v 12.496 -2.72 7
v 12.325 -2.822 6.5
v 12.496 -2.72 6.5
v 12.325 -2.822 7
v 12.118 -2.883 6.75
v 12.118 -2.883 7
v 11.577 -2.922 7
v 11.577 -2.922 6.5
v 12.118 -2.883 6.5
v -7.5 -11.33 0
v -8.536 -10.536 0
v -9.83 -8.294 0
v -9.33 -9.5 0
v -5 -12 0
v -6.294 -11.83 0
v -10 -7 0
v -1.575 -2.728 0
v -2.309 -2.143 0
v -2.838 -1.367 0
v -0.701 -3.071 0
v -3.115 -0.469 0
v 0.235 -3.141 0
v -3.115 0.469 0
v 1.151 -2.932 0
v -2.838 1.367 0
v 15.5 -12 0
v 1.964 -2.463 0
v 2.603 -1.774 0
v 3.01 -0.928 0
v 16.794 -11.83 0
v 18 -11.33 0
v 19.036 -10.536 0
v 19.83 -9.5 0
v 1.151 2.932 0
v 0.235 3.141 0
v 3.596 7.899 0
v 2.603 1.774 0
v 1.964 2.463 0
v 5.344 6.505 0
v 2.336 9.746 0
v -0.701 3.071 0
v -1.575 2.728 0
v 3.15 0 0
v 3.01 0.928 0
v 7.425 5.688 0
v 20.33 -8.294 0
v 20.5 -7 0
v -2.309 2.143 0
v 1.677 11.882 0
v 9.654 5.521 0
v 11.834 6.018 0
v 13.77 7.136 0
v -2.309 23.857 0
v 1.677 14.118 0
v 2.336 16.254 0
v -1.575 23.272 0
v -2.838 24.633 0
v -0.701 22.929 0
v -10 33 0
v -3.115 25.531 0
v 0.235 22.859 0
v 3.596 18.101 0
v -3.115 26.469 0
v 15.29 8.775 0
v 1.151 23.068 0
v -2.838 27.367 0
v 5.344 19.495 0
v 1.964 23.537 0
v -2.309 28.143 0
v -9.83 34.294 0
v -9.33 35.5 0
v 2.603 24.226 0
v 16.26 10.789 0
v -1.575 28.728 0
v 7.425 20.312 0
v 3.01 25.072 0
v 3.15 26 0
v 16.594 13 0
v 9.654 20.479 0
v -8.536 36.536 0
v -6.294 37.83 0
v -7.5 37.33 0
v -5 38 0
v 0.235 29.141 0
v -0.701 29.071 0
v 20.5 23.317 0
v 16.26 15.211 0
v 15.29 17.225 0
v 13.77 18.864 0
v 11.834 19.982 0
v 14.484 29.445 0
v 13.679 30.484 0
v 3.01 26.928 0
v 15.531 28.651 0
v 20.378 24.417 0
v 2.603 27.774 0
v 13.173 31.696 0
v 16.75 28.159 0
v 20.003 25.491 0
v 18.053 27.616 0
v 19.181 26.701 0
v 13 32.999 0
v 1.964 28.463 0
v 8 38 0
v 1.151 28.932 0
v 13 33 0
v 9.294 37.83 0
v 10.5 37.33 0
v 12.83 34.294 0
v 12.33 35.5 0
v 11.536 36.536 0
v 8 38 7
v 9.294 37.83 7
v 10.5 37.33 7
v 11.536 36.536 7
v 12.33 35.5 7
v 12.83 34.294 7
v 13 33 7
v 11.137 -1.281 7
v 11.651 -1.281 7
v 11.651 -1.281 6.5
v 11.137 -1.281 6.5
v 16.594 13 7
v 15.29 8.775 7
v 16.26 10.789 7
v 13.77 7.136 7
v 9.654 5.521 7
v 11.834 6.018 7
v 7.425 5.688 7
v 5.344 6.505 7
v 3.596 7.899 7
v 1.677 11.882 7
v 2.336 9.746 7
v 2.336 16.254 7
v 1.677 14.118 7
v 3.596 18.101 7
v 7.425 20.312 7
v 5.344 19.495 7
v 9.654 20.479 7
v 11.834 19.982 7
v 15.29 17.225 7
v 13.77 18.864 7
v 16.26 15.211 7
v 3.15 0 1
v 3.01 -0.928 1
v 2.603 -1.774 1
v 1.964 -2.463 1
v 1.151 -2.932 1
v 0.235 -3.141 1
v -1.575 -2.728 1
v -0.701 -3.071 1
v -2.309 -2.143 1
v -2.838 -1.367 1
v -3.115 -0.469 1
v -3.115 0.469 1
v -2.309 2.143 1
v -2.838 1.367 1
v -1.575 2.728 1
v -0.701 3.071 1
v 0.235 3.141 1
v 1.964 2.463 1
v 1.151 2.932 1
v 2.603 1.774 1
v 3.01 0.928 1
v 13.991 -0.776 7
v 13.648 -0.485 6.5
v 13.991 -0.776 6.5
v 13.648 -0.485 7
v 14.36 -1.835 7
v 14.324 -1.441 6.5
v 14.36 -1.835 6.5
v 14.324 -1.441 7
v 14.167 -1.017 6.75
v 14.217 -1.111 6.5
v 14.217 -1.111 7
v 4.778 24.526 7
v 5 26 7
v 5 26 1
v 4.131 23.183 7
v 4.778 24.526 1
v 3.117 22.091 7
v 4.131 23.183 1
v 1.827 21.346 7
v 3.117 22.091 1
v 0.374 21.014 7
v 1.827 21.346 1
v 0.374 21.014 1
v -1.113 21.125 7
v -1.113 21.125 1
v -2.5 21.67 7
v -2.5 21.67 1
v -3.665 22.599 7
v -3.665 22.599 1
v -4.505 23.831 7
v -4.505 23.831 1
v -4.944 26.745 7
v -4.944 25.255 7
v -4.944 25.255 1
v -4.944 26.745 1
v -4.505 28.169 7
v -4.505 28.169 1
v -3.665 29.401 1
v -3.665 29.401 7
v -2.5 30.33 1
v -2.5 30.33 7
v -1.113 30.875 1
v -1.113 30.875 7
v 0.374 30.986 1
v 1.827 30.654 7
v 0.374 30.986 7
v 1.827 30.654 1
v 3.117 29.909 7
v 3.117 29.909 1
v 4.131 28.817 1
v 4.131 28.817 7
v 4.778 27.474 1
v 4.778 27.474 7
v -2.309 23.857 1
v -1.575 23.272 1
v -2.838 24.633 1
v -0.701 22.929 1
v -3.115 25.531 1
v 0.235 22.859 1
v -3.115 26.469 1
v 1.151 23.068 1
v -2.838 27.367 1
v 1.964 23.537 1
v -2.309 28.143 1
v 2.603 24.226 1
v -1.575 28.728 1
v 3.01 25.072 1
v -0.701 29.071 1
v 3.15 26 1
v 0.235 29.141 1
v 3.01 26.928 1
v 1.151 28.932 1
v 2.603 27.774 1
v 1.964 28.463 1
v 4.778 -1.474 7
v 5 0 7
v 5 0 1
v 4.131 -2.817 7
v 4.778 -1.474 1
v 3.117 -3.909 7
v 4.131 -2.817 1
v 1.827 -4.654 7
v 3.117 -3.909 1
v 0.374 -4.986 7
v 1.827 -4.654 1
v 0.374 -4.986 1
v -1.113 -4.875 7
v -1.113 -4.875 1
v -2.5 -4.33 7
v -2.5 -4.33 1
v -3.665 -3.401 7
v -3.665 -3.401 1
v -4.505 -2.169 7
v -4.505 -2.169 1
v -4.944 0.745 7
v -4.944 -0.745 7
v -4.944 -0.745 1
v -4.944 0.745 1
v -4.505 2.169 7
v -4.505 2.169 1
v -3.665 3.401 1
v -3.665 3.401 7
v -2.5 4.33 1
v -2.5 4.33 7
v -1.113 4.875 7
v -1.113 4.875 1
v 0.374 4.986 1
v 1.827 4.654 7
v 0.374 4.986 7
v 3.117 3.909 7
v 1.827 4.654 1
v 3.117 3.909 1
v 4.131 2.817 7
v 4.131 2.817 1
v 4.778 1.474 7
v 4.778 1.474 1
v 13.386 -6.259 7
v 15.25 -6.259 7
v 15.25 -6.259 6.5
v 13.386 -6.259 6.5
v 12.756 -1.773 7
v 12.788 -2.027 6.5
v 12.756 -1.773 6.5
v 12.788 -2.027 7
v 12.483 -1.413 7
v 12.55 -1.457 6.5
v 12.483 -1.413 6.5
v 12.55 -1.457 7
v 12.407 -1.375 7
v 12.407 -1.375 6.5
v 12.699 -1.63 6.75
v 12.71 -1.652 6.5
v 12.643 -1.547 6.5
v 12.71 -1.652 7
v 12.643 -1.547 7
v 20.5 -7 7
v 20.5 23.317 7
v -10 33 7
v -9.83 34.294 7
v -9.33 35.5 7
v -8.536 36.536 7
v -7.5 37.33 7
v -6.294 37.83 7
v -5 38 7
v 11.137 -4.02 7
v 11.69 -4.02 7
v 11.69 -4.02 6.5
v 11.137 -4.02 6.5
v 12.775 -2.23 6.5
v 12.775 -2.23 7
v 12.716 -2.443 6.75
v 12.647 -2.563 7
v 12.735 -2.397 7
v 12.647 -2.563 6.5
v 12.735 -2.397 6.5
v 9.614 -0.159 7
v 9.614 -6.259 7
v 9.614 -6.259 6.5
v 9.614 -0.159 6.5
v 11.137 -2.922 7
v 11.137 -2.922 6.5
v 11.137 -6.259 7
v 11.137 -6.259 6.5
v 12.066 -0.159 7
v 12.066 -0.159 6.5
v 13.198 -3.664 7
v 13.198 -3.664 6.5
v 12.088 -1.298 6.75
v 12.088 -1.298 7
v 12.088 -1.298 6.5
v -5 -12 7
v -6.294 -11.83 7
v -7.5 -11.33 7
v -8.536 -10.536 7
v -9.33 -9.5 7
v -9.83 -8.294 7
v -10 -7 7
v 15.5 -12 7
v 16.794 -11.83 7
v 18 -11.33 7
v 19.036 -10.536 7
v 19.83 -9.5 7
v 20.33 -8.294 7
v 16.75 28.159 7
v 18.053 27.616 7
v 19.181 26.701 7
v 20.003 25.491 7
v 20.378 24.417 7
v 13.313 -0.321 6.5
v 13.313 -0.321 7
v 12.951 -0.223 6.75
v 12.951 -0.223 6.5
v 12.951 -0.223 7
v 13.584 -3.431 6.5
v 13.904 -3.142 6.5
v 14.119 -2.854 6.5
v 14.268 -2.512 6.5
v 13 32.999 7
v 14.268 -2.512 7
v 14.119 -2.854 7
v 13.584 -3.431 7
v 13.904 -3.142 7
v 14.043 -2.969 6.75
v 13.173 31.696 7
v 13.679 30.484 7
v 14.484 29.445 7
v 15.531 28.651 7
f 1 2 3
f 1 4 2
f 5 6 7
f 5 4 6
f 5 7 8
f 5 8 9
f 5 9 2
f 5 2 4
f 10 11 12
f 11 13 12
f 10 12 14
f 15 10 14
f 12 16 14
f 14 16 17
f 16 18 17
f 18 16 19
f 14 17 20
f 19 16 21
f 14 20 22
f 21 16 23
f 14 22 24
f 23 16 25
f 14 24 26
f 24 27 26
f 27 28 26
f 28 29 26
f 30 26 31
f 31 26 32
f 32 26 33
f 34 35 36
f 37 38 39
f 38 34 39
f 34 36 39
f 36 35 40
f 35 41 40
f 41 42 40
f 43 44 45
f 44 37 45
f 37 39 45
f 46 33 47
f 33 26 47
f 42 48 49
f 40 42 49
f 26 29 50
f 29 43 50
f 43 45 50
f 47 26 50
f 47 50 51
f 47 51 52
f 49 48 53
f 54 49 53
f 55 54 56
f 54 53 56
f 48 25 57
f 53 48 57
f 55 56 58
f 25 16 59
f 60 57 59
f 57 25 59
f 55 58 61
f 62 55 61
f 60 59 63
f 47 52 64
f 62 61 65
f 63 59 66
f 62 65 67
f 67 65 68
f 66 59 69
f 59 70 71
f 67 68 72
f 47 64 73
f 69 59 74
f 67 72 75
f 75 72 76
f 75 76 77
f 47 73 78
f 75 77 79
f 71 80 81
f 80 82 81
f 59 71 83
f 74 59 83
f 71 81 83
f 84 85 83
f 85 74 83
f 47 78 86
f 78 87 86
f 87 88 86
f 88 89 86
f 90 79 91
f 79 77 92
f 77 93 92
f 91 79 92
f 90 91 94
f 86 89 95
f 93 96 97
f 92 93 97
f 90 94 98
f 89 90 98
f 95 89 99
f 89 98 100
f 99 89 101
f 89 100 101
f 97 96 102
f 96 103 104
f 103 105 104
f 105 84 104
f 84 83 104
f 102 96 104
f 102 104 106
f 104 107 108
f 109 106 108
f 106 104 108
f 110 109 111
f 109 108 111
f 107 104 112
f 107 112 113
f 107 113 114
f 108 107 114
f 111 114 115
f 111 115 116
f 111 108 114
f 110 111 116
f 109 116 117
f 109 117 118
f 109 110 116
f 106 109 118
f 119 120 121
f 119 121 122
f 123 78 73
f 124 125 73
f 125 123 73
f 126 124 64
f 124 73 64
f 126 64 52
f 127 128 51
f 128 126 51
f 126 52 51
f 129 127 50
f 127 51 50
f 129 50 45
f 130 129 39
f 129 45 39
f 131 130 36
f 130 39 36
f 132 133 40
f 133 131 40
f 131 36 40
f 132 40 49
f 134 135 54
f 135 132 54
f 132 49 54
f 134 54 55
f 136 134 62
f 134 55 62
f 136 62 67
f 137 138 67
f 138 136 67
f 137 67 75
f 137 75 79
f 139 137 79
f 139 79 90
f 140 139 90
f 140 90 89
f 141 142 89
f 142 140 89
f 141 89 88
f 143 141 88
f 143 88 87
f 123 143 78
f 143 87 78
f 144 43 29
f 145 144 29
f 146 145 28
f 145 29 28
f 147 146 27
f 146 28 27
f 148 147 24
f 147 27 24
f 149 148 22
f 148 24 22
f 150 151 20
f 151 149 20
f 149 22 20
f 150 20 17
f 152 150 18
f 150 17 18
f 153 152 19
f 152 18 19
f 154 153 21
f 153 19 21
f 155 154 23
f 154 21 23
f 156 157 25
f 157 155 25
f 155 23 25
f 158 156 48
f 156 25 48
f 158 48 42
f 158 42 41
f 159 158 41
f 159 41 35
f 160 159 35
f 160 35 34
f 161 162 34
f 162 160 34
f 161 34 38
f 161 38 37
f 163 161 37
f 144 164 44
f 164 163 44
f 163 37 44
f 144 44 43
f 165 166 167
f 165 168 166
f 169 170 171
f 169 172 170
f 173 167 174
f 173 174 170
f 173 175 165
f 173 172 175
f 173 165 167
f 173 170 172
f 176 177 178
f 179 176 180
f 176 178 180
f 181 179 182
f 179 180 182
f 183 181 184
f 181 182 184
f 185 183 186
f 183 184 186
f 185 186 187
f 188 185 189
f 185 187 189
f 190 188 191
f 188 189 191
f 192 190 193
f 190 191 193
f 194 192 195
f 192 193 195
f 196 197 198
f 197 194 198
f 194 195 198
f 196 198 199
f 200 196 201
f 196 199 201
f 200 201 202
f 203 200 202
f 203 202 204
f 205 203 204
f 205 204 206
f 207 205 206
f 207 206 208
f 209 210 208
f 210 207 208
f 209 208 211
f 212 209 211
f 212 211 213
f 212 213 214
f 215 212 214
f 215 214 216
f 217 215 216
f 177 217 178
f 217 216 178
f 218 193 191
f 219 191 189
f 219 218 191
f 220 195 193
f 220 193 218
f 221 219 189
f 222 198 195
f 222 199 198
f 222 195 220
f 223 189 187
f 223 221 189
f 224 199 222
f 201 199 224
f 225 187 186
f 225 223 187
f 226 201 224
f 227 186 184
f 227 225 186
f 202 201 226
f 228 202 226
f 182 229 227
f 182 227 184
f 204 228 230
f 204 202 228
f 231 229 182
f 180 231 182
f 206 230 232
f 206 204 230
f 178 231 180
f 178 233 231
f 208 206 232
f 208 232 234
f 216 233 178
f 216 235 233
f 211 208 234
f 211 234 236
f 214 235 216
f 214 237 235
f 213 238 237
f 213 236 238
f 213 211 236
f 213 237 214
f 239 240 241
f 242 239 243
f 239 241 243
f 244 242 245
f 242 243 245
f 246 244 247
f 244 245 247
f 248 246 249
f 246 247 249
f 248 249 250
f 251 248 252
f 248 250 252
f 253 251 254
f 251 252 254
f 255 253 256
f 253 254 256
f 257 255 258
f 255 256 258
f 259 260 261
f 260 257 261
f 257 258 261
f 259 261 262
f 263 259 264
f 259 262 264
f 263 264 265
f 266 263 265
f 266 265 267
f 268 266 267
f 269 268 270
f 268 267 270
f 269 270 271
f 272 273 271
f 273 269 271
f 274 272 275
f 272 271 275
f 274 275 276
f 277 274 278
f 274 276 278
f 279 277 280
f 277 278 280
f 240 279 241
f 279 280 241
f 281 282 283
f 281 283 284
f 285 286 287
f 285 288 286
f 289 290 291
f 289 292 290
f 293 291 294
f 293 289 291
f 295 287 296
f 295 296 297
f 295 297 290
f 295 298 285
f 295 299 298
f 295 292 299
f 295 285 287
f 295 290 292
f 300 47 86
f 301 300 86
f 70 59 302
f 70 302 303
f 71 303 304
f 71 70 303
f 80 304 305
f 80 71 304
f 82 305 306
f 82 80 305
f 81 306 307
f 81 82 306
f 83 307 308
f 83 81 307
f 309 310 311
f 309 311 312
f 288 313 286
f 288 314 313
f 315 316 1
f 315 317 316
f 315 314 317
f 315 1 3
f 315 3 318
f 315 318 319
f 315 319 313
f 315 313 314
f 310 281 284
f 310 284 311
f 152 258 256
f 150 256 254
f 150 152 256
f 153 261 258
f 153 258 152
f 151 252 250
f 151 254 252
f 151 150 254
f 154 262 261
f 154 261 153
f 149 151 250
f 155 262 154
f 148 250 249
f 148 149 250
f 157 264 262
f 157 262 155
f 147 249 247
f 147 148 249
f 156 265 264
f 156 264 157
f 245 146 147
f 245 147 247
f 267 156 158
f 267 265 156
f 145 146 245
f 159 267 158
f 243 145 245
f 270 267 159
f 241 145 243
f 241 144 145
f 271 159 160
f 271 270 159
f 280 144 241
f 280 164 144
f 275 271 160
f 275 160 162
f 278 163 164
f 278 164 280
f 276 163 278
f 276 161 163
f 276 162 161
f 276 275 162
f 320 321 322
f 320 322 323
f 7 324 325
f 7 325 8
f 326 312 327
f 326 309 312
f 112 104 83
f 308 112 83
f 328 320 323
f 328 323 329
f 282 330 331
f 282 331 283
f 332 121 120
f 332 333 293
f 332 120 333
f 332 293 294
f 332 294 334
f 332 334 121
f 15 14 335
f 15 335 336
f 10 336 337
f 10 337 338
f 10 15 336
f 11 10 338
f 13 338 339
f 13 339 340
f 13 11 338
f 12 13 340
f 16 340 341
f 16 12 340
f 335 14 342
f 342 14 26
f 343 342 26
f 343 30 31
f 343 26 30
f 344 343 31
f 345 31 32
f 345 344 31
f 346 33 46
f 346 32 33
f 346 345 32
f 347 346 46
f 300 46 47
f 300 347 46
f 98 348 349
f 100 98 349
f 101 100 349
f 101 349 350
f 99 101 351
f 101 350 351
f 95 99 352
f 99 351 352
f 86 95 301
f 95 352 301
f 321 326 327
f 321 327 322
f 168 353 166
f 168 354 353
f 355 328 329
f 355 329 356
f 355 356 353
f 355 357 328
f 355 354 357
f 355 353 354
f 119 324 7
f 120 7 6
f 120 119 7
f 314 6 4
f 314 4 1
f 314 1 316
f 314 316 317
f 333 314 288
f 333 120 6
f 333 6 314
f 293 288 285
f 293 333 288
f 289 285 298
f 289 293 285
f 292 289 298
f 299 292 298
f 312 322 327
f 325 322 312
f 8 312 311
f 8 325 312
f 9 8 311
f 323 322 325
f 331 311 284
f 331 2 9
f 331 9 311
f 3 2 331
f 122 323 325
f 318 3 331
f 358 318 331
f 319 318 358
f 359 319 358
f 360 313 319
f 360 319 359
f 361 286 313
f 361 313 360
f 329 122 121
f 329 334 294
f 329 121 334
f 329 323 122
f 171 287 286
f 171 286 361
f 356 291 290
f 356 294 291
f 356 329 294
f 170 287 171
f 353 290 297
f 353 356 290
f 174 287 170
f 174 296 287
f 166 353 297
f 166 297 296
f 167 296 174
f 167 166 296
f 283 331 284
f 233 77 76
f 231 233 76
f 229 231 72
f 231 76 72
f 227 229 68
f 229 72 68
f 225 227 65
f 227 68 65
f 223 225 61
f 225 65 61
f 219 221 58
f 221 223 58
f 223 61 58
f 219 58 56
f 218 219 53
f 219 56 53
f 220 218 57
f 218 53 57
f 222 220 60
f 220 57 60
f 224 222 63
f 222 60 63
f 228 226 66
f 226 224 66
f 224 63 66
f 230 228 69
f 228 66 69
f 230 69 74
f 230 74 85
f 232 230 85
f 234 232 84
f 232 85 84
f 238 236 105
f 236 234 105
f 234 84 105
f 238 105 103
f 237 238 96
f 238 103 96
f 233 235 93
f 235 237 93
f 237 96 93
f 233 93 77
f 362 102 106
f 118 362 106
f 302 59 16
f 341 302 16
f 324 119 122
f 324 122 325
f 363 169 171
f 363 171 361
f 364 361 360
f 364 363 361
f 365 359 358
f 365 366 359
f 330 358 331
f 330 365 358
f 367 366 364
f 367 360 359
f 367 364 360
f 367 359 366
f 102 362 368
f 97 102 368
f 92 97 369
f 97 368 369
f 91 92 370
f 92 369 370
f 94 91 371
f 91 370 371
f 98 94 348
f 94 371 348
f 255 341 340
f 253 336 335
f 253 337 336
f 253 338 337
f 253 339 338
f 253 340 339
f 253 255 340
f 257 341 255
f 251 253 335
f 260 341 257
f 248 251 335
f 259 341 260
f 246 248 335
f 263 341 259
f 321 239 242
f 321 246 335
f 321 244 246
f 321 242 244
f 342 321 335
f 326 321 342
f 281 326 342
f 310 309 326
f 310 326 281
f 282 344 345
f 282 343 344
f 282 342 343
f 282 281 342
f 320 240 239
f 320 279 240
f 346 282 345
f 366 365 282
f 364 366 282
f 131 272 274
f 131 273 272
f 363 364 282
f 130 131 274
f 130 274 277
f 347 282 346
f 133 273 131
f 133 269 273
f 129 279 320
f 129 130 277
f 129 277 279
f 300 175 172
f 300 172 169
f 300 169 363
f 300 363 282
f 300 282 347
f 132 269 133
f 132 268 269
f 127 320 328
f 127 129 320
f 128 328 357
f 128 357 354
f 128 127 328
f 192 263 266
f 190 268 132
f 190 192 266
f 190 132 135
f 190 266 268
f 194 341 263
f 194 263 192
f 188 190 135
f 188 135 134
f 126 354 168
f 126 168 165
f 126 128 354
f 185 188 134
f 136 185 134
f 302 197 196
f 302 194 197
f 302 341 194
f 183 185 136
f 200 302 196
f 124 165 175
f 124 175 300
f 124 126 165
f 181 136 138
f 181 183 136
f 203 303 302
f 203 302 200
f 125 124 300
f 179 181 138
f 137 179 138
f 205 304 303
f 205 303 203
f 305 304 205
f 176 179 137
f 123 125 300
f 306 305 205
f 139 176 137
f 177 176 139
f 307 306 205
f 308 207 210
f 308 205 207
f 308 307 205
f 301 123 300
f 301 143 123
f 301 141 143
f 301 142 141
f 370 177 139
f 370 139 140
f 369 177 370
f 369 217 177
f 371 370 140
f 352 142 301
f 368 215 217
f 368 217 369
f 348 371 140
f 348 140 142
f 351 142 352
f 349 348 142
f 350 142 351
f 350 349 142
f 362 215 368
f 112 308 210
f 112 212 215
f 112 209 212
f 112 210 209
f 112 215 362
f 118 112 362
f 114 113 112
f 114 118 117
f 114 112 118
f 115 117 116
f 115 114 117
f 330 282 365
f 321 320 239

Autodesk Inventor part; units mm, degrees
ref_plane "YZ Plane" through (0, 0, 0) normal (1, 0, 0) x (0, 1, 0)
ref_plane "XZ Plane" through (0, 0, 0) normal (0, 1, 0) x (-1, 0, 0)
ref_plane "XY Plane" through (0, 0, 0) normal (0, 0, 1) x (1, 0, 0)
sketch "S-SupportBase" plane through (0, 0, 0) normal (0, 0, 1) x (1, 0, 0)
  line L0 (0, 48) -> (0, -22) construction
  line L1 (0, 0) -> (20.5, 0) construction
  circle A0 centre (0, 0) radius 5
  circle A1 centre (0, 0) radius 3.15
  line L2 (0, -12) -> (20.5, -12)
  line L3 (20.5, -12) -> (20.5, 28)
  line L4 (20.5, 28) -> (13, 28)
  line L5 (13, 28) -> (13, 38)
  line L6 (13, 38) -> (-10, 38)
  line L7 (-10, 38) -> (-10, -12)
  line L8 (-10, -12) -> (0, -12)
  circle A2 centre (0, 26) radius 5
  circle A3 centre (0, 26) radius 3.15
  circle A4 centre (9.0936, 13) radius 7.5
  line L9 (8.9816, -0.1589) -> (15.0717, -0.1589) construction
  line L10 (15.0717, -0.1589) -> (15.0717, -6.2589) construction
  line L11 (15.0717, -6.2589) -> (8.9816, -6.2589) construction
  line L12 (8.9816, -6.2589) -> (8.9816, -0.1589) construction
  line L13 (15.2496, -6.2589) -> (13.386, -6.2589)
  line L14 (13.386, -6.2589) -> (11.6905, -4.0196)
  line L15 (11.6905, -4.0196) -> (11.1368, -4.0196)
  line L16 (11.1368, -4.0196) -> (11.1368, -6.2589)
  line L17 (11.1368, -6.2589) -> (9.6143, -6.2589)
  line L18 (9.6143, -6.2589) -> (9.6143, -0.1589)
  line L19 (9.6143, -0.1589) -> (12.0662, -0.1589)
  spline S0 degree 2 poles (12.0662, -0.1589) (12.5753, -0.1589) (13.3267, -0.2875) (13.648, -0.4852) knots 0 0 0 1 2 2 2
  spline S1 degree 2 poles (13.648, -0.4852) (13.9743, -0.6928) (14.3598, -1.3404) (14.3598, -1.8347) knots 0 0 0 1 2 2 2
  spline S2 degree 2 poles (14.3598, -1.8347) (14.3598, -2.5317) (13.7271, -3.4067) (13.1982, -3.6637) knots 0 0 0 1 2 2 2
  line L20 (13.1982, -3.6637) -> (15.2496, -6.2589)
  spline S3 degree 2 poles (12.7879, -2.0275) (12.7879, -1.7952) (12.6099, -1.464) (12.4072, -1.375) knots 0 0 0 1 2 2 2
  spline S4 degree 2 poles (12.4072, -1.375) (12.2639, -1.3157) (11.9129, -1.2811) (11.6509, -1.2811) knots 0 0 0 1 2 2 2
  line L21 (11.6509, -1.2811) -> (11.1368, -1.2811)
  line L22 (11.1368, -1.2811) -> (11.1368, -2.9222)
  line L23 (11.1368, -2.9222) -> (11.5768, -2.9222)
  spline S5 degree 2 poles (11.5768, -2.9222) (11.8931, -2.9222) (12.343, -2.8431) (12.4962, -2.7196) knots 0 0 0 1 2 2 2
  spline S6 degree 2 poles (12.4962, -2.7196) (12.6445, -2.6009) (12.7879, -2.2846) (12.7879, -2.0275) knots 0 0 0 1 2 2 2
  dimension "d0" = 20.5
  dimension "d1" = 10
  dimension "d2" = 6.3
  dimension "d3" = 12
  dimension "d4" = 10
  dimension "d5" = 40
  dimension "d6" = 10
  dimension "d9" = 26
  dimension "d14" = 23
  dimension "d20" = 15
extrude "Ex-Base1" add sketch "S-SupportBase" along normal blind 1 contours A0 | L8 L7 L6 L5 L4 L3 L2 | A2 | L13 L14 L15 L16 L17 L18 L19 S0 S1 S2 L20 | S6 S5 L23 L22 L21 S4 S3
extrude "Ex-Base2" add sketch "S-SupportBase" along normal blind 7 contours L8 L7 L6 L5 L4 L3 L2 | L13 L14 L15 L16 L17 L18 L19 S0 S1 S2 L20 | S6 S5 L23 L22 L21 S4 S3
fillet "Rundung1" radius 5 6 edges at (-10, -12, 3.5) (-10, 38, 3.5) (13, 38, 3.5) (13, 28, 3.5) (20.5, 28, 3.5) (20.5, -12, 3.5)
extrude "Extrusion3" cut sketch "S-SupportBase" against normal blind 0.5 from surface at 7 contours L13 L14 L15 L16 L17 L18 L19 S0 S1 S2 L20
properties part number "xy Motor Support Right for 4040 extra"
